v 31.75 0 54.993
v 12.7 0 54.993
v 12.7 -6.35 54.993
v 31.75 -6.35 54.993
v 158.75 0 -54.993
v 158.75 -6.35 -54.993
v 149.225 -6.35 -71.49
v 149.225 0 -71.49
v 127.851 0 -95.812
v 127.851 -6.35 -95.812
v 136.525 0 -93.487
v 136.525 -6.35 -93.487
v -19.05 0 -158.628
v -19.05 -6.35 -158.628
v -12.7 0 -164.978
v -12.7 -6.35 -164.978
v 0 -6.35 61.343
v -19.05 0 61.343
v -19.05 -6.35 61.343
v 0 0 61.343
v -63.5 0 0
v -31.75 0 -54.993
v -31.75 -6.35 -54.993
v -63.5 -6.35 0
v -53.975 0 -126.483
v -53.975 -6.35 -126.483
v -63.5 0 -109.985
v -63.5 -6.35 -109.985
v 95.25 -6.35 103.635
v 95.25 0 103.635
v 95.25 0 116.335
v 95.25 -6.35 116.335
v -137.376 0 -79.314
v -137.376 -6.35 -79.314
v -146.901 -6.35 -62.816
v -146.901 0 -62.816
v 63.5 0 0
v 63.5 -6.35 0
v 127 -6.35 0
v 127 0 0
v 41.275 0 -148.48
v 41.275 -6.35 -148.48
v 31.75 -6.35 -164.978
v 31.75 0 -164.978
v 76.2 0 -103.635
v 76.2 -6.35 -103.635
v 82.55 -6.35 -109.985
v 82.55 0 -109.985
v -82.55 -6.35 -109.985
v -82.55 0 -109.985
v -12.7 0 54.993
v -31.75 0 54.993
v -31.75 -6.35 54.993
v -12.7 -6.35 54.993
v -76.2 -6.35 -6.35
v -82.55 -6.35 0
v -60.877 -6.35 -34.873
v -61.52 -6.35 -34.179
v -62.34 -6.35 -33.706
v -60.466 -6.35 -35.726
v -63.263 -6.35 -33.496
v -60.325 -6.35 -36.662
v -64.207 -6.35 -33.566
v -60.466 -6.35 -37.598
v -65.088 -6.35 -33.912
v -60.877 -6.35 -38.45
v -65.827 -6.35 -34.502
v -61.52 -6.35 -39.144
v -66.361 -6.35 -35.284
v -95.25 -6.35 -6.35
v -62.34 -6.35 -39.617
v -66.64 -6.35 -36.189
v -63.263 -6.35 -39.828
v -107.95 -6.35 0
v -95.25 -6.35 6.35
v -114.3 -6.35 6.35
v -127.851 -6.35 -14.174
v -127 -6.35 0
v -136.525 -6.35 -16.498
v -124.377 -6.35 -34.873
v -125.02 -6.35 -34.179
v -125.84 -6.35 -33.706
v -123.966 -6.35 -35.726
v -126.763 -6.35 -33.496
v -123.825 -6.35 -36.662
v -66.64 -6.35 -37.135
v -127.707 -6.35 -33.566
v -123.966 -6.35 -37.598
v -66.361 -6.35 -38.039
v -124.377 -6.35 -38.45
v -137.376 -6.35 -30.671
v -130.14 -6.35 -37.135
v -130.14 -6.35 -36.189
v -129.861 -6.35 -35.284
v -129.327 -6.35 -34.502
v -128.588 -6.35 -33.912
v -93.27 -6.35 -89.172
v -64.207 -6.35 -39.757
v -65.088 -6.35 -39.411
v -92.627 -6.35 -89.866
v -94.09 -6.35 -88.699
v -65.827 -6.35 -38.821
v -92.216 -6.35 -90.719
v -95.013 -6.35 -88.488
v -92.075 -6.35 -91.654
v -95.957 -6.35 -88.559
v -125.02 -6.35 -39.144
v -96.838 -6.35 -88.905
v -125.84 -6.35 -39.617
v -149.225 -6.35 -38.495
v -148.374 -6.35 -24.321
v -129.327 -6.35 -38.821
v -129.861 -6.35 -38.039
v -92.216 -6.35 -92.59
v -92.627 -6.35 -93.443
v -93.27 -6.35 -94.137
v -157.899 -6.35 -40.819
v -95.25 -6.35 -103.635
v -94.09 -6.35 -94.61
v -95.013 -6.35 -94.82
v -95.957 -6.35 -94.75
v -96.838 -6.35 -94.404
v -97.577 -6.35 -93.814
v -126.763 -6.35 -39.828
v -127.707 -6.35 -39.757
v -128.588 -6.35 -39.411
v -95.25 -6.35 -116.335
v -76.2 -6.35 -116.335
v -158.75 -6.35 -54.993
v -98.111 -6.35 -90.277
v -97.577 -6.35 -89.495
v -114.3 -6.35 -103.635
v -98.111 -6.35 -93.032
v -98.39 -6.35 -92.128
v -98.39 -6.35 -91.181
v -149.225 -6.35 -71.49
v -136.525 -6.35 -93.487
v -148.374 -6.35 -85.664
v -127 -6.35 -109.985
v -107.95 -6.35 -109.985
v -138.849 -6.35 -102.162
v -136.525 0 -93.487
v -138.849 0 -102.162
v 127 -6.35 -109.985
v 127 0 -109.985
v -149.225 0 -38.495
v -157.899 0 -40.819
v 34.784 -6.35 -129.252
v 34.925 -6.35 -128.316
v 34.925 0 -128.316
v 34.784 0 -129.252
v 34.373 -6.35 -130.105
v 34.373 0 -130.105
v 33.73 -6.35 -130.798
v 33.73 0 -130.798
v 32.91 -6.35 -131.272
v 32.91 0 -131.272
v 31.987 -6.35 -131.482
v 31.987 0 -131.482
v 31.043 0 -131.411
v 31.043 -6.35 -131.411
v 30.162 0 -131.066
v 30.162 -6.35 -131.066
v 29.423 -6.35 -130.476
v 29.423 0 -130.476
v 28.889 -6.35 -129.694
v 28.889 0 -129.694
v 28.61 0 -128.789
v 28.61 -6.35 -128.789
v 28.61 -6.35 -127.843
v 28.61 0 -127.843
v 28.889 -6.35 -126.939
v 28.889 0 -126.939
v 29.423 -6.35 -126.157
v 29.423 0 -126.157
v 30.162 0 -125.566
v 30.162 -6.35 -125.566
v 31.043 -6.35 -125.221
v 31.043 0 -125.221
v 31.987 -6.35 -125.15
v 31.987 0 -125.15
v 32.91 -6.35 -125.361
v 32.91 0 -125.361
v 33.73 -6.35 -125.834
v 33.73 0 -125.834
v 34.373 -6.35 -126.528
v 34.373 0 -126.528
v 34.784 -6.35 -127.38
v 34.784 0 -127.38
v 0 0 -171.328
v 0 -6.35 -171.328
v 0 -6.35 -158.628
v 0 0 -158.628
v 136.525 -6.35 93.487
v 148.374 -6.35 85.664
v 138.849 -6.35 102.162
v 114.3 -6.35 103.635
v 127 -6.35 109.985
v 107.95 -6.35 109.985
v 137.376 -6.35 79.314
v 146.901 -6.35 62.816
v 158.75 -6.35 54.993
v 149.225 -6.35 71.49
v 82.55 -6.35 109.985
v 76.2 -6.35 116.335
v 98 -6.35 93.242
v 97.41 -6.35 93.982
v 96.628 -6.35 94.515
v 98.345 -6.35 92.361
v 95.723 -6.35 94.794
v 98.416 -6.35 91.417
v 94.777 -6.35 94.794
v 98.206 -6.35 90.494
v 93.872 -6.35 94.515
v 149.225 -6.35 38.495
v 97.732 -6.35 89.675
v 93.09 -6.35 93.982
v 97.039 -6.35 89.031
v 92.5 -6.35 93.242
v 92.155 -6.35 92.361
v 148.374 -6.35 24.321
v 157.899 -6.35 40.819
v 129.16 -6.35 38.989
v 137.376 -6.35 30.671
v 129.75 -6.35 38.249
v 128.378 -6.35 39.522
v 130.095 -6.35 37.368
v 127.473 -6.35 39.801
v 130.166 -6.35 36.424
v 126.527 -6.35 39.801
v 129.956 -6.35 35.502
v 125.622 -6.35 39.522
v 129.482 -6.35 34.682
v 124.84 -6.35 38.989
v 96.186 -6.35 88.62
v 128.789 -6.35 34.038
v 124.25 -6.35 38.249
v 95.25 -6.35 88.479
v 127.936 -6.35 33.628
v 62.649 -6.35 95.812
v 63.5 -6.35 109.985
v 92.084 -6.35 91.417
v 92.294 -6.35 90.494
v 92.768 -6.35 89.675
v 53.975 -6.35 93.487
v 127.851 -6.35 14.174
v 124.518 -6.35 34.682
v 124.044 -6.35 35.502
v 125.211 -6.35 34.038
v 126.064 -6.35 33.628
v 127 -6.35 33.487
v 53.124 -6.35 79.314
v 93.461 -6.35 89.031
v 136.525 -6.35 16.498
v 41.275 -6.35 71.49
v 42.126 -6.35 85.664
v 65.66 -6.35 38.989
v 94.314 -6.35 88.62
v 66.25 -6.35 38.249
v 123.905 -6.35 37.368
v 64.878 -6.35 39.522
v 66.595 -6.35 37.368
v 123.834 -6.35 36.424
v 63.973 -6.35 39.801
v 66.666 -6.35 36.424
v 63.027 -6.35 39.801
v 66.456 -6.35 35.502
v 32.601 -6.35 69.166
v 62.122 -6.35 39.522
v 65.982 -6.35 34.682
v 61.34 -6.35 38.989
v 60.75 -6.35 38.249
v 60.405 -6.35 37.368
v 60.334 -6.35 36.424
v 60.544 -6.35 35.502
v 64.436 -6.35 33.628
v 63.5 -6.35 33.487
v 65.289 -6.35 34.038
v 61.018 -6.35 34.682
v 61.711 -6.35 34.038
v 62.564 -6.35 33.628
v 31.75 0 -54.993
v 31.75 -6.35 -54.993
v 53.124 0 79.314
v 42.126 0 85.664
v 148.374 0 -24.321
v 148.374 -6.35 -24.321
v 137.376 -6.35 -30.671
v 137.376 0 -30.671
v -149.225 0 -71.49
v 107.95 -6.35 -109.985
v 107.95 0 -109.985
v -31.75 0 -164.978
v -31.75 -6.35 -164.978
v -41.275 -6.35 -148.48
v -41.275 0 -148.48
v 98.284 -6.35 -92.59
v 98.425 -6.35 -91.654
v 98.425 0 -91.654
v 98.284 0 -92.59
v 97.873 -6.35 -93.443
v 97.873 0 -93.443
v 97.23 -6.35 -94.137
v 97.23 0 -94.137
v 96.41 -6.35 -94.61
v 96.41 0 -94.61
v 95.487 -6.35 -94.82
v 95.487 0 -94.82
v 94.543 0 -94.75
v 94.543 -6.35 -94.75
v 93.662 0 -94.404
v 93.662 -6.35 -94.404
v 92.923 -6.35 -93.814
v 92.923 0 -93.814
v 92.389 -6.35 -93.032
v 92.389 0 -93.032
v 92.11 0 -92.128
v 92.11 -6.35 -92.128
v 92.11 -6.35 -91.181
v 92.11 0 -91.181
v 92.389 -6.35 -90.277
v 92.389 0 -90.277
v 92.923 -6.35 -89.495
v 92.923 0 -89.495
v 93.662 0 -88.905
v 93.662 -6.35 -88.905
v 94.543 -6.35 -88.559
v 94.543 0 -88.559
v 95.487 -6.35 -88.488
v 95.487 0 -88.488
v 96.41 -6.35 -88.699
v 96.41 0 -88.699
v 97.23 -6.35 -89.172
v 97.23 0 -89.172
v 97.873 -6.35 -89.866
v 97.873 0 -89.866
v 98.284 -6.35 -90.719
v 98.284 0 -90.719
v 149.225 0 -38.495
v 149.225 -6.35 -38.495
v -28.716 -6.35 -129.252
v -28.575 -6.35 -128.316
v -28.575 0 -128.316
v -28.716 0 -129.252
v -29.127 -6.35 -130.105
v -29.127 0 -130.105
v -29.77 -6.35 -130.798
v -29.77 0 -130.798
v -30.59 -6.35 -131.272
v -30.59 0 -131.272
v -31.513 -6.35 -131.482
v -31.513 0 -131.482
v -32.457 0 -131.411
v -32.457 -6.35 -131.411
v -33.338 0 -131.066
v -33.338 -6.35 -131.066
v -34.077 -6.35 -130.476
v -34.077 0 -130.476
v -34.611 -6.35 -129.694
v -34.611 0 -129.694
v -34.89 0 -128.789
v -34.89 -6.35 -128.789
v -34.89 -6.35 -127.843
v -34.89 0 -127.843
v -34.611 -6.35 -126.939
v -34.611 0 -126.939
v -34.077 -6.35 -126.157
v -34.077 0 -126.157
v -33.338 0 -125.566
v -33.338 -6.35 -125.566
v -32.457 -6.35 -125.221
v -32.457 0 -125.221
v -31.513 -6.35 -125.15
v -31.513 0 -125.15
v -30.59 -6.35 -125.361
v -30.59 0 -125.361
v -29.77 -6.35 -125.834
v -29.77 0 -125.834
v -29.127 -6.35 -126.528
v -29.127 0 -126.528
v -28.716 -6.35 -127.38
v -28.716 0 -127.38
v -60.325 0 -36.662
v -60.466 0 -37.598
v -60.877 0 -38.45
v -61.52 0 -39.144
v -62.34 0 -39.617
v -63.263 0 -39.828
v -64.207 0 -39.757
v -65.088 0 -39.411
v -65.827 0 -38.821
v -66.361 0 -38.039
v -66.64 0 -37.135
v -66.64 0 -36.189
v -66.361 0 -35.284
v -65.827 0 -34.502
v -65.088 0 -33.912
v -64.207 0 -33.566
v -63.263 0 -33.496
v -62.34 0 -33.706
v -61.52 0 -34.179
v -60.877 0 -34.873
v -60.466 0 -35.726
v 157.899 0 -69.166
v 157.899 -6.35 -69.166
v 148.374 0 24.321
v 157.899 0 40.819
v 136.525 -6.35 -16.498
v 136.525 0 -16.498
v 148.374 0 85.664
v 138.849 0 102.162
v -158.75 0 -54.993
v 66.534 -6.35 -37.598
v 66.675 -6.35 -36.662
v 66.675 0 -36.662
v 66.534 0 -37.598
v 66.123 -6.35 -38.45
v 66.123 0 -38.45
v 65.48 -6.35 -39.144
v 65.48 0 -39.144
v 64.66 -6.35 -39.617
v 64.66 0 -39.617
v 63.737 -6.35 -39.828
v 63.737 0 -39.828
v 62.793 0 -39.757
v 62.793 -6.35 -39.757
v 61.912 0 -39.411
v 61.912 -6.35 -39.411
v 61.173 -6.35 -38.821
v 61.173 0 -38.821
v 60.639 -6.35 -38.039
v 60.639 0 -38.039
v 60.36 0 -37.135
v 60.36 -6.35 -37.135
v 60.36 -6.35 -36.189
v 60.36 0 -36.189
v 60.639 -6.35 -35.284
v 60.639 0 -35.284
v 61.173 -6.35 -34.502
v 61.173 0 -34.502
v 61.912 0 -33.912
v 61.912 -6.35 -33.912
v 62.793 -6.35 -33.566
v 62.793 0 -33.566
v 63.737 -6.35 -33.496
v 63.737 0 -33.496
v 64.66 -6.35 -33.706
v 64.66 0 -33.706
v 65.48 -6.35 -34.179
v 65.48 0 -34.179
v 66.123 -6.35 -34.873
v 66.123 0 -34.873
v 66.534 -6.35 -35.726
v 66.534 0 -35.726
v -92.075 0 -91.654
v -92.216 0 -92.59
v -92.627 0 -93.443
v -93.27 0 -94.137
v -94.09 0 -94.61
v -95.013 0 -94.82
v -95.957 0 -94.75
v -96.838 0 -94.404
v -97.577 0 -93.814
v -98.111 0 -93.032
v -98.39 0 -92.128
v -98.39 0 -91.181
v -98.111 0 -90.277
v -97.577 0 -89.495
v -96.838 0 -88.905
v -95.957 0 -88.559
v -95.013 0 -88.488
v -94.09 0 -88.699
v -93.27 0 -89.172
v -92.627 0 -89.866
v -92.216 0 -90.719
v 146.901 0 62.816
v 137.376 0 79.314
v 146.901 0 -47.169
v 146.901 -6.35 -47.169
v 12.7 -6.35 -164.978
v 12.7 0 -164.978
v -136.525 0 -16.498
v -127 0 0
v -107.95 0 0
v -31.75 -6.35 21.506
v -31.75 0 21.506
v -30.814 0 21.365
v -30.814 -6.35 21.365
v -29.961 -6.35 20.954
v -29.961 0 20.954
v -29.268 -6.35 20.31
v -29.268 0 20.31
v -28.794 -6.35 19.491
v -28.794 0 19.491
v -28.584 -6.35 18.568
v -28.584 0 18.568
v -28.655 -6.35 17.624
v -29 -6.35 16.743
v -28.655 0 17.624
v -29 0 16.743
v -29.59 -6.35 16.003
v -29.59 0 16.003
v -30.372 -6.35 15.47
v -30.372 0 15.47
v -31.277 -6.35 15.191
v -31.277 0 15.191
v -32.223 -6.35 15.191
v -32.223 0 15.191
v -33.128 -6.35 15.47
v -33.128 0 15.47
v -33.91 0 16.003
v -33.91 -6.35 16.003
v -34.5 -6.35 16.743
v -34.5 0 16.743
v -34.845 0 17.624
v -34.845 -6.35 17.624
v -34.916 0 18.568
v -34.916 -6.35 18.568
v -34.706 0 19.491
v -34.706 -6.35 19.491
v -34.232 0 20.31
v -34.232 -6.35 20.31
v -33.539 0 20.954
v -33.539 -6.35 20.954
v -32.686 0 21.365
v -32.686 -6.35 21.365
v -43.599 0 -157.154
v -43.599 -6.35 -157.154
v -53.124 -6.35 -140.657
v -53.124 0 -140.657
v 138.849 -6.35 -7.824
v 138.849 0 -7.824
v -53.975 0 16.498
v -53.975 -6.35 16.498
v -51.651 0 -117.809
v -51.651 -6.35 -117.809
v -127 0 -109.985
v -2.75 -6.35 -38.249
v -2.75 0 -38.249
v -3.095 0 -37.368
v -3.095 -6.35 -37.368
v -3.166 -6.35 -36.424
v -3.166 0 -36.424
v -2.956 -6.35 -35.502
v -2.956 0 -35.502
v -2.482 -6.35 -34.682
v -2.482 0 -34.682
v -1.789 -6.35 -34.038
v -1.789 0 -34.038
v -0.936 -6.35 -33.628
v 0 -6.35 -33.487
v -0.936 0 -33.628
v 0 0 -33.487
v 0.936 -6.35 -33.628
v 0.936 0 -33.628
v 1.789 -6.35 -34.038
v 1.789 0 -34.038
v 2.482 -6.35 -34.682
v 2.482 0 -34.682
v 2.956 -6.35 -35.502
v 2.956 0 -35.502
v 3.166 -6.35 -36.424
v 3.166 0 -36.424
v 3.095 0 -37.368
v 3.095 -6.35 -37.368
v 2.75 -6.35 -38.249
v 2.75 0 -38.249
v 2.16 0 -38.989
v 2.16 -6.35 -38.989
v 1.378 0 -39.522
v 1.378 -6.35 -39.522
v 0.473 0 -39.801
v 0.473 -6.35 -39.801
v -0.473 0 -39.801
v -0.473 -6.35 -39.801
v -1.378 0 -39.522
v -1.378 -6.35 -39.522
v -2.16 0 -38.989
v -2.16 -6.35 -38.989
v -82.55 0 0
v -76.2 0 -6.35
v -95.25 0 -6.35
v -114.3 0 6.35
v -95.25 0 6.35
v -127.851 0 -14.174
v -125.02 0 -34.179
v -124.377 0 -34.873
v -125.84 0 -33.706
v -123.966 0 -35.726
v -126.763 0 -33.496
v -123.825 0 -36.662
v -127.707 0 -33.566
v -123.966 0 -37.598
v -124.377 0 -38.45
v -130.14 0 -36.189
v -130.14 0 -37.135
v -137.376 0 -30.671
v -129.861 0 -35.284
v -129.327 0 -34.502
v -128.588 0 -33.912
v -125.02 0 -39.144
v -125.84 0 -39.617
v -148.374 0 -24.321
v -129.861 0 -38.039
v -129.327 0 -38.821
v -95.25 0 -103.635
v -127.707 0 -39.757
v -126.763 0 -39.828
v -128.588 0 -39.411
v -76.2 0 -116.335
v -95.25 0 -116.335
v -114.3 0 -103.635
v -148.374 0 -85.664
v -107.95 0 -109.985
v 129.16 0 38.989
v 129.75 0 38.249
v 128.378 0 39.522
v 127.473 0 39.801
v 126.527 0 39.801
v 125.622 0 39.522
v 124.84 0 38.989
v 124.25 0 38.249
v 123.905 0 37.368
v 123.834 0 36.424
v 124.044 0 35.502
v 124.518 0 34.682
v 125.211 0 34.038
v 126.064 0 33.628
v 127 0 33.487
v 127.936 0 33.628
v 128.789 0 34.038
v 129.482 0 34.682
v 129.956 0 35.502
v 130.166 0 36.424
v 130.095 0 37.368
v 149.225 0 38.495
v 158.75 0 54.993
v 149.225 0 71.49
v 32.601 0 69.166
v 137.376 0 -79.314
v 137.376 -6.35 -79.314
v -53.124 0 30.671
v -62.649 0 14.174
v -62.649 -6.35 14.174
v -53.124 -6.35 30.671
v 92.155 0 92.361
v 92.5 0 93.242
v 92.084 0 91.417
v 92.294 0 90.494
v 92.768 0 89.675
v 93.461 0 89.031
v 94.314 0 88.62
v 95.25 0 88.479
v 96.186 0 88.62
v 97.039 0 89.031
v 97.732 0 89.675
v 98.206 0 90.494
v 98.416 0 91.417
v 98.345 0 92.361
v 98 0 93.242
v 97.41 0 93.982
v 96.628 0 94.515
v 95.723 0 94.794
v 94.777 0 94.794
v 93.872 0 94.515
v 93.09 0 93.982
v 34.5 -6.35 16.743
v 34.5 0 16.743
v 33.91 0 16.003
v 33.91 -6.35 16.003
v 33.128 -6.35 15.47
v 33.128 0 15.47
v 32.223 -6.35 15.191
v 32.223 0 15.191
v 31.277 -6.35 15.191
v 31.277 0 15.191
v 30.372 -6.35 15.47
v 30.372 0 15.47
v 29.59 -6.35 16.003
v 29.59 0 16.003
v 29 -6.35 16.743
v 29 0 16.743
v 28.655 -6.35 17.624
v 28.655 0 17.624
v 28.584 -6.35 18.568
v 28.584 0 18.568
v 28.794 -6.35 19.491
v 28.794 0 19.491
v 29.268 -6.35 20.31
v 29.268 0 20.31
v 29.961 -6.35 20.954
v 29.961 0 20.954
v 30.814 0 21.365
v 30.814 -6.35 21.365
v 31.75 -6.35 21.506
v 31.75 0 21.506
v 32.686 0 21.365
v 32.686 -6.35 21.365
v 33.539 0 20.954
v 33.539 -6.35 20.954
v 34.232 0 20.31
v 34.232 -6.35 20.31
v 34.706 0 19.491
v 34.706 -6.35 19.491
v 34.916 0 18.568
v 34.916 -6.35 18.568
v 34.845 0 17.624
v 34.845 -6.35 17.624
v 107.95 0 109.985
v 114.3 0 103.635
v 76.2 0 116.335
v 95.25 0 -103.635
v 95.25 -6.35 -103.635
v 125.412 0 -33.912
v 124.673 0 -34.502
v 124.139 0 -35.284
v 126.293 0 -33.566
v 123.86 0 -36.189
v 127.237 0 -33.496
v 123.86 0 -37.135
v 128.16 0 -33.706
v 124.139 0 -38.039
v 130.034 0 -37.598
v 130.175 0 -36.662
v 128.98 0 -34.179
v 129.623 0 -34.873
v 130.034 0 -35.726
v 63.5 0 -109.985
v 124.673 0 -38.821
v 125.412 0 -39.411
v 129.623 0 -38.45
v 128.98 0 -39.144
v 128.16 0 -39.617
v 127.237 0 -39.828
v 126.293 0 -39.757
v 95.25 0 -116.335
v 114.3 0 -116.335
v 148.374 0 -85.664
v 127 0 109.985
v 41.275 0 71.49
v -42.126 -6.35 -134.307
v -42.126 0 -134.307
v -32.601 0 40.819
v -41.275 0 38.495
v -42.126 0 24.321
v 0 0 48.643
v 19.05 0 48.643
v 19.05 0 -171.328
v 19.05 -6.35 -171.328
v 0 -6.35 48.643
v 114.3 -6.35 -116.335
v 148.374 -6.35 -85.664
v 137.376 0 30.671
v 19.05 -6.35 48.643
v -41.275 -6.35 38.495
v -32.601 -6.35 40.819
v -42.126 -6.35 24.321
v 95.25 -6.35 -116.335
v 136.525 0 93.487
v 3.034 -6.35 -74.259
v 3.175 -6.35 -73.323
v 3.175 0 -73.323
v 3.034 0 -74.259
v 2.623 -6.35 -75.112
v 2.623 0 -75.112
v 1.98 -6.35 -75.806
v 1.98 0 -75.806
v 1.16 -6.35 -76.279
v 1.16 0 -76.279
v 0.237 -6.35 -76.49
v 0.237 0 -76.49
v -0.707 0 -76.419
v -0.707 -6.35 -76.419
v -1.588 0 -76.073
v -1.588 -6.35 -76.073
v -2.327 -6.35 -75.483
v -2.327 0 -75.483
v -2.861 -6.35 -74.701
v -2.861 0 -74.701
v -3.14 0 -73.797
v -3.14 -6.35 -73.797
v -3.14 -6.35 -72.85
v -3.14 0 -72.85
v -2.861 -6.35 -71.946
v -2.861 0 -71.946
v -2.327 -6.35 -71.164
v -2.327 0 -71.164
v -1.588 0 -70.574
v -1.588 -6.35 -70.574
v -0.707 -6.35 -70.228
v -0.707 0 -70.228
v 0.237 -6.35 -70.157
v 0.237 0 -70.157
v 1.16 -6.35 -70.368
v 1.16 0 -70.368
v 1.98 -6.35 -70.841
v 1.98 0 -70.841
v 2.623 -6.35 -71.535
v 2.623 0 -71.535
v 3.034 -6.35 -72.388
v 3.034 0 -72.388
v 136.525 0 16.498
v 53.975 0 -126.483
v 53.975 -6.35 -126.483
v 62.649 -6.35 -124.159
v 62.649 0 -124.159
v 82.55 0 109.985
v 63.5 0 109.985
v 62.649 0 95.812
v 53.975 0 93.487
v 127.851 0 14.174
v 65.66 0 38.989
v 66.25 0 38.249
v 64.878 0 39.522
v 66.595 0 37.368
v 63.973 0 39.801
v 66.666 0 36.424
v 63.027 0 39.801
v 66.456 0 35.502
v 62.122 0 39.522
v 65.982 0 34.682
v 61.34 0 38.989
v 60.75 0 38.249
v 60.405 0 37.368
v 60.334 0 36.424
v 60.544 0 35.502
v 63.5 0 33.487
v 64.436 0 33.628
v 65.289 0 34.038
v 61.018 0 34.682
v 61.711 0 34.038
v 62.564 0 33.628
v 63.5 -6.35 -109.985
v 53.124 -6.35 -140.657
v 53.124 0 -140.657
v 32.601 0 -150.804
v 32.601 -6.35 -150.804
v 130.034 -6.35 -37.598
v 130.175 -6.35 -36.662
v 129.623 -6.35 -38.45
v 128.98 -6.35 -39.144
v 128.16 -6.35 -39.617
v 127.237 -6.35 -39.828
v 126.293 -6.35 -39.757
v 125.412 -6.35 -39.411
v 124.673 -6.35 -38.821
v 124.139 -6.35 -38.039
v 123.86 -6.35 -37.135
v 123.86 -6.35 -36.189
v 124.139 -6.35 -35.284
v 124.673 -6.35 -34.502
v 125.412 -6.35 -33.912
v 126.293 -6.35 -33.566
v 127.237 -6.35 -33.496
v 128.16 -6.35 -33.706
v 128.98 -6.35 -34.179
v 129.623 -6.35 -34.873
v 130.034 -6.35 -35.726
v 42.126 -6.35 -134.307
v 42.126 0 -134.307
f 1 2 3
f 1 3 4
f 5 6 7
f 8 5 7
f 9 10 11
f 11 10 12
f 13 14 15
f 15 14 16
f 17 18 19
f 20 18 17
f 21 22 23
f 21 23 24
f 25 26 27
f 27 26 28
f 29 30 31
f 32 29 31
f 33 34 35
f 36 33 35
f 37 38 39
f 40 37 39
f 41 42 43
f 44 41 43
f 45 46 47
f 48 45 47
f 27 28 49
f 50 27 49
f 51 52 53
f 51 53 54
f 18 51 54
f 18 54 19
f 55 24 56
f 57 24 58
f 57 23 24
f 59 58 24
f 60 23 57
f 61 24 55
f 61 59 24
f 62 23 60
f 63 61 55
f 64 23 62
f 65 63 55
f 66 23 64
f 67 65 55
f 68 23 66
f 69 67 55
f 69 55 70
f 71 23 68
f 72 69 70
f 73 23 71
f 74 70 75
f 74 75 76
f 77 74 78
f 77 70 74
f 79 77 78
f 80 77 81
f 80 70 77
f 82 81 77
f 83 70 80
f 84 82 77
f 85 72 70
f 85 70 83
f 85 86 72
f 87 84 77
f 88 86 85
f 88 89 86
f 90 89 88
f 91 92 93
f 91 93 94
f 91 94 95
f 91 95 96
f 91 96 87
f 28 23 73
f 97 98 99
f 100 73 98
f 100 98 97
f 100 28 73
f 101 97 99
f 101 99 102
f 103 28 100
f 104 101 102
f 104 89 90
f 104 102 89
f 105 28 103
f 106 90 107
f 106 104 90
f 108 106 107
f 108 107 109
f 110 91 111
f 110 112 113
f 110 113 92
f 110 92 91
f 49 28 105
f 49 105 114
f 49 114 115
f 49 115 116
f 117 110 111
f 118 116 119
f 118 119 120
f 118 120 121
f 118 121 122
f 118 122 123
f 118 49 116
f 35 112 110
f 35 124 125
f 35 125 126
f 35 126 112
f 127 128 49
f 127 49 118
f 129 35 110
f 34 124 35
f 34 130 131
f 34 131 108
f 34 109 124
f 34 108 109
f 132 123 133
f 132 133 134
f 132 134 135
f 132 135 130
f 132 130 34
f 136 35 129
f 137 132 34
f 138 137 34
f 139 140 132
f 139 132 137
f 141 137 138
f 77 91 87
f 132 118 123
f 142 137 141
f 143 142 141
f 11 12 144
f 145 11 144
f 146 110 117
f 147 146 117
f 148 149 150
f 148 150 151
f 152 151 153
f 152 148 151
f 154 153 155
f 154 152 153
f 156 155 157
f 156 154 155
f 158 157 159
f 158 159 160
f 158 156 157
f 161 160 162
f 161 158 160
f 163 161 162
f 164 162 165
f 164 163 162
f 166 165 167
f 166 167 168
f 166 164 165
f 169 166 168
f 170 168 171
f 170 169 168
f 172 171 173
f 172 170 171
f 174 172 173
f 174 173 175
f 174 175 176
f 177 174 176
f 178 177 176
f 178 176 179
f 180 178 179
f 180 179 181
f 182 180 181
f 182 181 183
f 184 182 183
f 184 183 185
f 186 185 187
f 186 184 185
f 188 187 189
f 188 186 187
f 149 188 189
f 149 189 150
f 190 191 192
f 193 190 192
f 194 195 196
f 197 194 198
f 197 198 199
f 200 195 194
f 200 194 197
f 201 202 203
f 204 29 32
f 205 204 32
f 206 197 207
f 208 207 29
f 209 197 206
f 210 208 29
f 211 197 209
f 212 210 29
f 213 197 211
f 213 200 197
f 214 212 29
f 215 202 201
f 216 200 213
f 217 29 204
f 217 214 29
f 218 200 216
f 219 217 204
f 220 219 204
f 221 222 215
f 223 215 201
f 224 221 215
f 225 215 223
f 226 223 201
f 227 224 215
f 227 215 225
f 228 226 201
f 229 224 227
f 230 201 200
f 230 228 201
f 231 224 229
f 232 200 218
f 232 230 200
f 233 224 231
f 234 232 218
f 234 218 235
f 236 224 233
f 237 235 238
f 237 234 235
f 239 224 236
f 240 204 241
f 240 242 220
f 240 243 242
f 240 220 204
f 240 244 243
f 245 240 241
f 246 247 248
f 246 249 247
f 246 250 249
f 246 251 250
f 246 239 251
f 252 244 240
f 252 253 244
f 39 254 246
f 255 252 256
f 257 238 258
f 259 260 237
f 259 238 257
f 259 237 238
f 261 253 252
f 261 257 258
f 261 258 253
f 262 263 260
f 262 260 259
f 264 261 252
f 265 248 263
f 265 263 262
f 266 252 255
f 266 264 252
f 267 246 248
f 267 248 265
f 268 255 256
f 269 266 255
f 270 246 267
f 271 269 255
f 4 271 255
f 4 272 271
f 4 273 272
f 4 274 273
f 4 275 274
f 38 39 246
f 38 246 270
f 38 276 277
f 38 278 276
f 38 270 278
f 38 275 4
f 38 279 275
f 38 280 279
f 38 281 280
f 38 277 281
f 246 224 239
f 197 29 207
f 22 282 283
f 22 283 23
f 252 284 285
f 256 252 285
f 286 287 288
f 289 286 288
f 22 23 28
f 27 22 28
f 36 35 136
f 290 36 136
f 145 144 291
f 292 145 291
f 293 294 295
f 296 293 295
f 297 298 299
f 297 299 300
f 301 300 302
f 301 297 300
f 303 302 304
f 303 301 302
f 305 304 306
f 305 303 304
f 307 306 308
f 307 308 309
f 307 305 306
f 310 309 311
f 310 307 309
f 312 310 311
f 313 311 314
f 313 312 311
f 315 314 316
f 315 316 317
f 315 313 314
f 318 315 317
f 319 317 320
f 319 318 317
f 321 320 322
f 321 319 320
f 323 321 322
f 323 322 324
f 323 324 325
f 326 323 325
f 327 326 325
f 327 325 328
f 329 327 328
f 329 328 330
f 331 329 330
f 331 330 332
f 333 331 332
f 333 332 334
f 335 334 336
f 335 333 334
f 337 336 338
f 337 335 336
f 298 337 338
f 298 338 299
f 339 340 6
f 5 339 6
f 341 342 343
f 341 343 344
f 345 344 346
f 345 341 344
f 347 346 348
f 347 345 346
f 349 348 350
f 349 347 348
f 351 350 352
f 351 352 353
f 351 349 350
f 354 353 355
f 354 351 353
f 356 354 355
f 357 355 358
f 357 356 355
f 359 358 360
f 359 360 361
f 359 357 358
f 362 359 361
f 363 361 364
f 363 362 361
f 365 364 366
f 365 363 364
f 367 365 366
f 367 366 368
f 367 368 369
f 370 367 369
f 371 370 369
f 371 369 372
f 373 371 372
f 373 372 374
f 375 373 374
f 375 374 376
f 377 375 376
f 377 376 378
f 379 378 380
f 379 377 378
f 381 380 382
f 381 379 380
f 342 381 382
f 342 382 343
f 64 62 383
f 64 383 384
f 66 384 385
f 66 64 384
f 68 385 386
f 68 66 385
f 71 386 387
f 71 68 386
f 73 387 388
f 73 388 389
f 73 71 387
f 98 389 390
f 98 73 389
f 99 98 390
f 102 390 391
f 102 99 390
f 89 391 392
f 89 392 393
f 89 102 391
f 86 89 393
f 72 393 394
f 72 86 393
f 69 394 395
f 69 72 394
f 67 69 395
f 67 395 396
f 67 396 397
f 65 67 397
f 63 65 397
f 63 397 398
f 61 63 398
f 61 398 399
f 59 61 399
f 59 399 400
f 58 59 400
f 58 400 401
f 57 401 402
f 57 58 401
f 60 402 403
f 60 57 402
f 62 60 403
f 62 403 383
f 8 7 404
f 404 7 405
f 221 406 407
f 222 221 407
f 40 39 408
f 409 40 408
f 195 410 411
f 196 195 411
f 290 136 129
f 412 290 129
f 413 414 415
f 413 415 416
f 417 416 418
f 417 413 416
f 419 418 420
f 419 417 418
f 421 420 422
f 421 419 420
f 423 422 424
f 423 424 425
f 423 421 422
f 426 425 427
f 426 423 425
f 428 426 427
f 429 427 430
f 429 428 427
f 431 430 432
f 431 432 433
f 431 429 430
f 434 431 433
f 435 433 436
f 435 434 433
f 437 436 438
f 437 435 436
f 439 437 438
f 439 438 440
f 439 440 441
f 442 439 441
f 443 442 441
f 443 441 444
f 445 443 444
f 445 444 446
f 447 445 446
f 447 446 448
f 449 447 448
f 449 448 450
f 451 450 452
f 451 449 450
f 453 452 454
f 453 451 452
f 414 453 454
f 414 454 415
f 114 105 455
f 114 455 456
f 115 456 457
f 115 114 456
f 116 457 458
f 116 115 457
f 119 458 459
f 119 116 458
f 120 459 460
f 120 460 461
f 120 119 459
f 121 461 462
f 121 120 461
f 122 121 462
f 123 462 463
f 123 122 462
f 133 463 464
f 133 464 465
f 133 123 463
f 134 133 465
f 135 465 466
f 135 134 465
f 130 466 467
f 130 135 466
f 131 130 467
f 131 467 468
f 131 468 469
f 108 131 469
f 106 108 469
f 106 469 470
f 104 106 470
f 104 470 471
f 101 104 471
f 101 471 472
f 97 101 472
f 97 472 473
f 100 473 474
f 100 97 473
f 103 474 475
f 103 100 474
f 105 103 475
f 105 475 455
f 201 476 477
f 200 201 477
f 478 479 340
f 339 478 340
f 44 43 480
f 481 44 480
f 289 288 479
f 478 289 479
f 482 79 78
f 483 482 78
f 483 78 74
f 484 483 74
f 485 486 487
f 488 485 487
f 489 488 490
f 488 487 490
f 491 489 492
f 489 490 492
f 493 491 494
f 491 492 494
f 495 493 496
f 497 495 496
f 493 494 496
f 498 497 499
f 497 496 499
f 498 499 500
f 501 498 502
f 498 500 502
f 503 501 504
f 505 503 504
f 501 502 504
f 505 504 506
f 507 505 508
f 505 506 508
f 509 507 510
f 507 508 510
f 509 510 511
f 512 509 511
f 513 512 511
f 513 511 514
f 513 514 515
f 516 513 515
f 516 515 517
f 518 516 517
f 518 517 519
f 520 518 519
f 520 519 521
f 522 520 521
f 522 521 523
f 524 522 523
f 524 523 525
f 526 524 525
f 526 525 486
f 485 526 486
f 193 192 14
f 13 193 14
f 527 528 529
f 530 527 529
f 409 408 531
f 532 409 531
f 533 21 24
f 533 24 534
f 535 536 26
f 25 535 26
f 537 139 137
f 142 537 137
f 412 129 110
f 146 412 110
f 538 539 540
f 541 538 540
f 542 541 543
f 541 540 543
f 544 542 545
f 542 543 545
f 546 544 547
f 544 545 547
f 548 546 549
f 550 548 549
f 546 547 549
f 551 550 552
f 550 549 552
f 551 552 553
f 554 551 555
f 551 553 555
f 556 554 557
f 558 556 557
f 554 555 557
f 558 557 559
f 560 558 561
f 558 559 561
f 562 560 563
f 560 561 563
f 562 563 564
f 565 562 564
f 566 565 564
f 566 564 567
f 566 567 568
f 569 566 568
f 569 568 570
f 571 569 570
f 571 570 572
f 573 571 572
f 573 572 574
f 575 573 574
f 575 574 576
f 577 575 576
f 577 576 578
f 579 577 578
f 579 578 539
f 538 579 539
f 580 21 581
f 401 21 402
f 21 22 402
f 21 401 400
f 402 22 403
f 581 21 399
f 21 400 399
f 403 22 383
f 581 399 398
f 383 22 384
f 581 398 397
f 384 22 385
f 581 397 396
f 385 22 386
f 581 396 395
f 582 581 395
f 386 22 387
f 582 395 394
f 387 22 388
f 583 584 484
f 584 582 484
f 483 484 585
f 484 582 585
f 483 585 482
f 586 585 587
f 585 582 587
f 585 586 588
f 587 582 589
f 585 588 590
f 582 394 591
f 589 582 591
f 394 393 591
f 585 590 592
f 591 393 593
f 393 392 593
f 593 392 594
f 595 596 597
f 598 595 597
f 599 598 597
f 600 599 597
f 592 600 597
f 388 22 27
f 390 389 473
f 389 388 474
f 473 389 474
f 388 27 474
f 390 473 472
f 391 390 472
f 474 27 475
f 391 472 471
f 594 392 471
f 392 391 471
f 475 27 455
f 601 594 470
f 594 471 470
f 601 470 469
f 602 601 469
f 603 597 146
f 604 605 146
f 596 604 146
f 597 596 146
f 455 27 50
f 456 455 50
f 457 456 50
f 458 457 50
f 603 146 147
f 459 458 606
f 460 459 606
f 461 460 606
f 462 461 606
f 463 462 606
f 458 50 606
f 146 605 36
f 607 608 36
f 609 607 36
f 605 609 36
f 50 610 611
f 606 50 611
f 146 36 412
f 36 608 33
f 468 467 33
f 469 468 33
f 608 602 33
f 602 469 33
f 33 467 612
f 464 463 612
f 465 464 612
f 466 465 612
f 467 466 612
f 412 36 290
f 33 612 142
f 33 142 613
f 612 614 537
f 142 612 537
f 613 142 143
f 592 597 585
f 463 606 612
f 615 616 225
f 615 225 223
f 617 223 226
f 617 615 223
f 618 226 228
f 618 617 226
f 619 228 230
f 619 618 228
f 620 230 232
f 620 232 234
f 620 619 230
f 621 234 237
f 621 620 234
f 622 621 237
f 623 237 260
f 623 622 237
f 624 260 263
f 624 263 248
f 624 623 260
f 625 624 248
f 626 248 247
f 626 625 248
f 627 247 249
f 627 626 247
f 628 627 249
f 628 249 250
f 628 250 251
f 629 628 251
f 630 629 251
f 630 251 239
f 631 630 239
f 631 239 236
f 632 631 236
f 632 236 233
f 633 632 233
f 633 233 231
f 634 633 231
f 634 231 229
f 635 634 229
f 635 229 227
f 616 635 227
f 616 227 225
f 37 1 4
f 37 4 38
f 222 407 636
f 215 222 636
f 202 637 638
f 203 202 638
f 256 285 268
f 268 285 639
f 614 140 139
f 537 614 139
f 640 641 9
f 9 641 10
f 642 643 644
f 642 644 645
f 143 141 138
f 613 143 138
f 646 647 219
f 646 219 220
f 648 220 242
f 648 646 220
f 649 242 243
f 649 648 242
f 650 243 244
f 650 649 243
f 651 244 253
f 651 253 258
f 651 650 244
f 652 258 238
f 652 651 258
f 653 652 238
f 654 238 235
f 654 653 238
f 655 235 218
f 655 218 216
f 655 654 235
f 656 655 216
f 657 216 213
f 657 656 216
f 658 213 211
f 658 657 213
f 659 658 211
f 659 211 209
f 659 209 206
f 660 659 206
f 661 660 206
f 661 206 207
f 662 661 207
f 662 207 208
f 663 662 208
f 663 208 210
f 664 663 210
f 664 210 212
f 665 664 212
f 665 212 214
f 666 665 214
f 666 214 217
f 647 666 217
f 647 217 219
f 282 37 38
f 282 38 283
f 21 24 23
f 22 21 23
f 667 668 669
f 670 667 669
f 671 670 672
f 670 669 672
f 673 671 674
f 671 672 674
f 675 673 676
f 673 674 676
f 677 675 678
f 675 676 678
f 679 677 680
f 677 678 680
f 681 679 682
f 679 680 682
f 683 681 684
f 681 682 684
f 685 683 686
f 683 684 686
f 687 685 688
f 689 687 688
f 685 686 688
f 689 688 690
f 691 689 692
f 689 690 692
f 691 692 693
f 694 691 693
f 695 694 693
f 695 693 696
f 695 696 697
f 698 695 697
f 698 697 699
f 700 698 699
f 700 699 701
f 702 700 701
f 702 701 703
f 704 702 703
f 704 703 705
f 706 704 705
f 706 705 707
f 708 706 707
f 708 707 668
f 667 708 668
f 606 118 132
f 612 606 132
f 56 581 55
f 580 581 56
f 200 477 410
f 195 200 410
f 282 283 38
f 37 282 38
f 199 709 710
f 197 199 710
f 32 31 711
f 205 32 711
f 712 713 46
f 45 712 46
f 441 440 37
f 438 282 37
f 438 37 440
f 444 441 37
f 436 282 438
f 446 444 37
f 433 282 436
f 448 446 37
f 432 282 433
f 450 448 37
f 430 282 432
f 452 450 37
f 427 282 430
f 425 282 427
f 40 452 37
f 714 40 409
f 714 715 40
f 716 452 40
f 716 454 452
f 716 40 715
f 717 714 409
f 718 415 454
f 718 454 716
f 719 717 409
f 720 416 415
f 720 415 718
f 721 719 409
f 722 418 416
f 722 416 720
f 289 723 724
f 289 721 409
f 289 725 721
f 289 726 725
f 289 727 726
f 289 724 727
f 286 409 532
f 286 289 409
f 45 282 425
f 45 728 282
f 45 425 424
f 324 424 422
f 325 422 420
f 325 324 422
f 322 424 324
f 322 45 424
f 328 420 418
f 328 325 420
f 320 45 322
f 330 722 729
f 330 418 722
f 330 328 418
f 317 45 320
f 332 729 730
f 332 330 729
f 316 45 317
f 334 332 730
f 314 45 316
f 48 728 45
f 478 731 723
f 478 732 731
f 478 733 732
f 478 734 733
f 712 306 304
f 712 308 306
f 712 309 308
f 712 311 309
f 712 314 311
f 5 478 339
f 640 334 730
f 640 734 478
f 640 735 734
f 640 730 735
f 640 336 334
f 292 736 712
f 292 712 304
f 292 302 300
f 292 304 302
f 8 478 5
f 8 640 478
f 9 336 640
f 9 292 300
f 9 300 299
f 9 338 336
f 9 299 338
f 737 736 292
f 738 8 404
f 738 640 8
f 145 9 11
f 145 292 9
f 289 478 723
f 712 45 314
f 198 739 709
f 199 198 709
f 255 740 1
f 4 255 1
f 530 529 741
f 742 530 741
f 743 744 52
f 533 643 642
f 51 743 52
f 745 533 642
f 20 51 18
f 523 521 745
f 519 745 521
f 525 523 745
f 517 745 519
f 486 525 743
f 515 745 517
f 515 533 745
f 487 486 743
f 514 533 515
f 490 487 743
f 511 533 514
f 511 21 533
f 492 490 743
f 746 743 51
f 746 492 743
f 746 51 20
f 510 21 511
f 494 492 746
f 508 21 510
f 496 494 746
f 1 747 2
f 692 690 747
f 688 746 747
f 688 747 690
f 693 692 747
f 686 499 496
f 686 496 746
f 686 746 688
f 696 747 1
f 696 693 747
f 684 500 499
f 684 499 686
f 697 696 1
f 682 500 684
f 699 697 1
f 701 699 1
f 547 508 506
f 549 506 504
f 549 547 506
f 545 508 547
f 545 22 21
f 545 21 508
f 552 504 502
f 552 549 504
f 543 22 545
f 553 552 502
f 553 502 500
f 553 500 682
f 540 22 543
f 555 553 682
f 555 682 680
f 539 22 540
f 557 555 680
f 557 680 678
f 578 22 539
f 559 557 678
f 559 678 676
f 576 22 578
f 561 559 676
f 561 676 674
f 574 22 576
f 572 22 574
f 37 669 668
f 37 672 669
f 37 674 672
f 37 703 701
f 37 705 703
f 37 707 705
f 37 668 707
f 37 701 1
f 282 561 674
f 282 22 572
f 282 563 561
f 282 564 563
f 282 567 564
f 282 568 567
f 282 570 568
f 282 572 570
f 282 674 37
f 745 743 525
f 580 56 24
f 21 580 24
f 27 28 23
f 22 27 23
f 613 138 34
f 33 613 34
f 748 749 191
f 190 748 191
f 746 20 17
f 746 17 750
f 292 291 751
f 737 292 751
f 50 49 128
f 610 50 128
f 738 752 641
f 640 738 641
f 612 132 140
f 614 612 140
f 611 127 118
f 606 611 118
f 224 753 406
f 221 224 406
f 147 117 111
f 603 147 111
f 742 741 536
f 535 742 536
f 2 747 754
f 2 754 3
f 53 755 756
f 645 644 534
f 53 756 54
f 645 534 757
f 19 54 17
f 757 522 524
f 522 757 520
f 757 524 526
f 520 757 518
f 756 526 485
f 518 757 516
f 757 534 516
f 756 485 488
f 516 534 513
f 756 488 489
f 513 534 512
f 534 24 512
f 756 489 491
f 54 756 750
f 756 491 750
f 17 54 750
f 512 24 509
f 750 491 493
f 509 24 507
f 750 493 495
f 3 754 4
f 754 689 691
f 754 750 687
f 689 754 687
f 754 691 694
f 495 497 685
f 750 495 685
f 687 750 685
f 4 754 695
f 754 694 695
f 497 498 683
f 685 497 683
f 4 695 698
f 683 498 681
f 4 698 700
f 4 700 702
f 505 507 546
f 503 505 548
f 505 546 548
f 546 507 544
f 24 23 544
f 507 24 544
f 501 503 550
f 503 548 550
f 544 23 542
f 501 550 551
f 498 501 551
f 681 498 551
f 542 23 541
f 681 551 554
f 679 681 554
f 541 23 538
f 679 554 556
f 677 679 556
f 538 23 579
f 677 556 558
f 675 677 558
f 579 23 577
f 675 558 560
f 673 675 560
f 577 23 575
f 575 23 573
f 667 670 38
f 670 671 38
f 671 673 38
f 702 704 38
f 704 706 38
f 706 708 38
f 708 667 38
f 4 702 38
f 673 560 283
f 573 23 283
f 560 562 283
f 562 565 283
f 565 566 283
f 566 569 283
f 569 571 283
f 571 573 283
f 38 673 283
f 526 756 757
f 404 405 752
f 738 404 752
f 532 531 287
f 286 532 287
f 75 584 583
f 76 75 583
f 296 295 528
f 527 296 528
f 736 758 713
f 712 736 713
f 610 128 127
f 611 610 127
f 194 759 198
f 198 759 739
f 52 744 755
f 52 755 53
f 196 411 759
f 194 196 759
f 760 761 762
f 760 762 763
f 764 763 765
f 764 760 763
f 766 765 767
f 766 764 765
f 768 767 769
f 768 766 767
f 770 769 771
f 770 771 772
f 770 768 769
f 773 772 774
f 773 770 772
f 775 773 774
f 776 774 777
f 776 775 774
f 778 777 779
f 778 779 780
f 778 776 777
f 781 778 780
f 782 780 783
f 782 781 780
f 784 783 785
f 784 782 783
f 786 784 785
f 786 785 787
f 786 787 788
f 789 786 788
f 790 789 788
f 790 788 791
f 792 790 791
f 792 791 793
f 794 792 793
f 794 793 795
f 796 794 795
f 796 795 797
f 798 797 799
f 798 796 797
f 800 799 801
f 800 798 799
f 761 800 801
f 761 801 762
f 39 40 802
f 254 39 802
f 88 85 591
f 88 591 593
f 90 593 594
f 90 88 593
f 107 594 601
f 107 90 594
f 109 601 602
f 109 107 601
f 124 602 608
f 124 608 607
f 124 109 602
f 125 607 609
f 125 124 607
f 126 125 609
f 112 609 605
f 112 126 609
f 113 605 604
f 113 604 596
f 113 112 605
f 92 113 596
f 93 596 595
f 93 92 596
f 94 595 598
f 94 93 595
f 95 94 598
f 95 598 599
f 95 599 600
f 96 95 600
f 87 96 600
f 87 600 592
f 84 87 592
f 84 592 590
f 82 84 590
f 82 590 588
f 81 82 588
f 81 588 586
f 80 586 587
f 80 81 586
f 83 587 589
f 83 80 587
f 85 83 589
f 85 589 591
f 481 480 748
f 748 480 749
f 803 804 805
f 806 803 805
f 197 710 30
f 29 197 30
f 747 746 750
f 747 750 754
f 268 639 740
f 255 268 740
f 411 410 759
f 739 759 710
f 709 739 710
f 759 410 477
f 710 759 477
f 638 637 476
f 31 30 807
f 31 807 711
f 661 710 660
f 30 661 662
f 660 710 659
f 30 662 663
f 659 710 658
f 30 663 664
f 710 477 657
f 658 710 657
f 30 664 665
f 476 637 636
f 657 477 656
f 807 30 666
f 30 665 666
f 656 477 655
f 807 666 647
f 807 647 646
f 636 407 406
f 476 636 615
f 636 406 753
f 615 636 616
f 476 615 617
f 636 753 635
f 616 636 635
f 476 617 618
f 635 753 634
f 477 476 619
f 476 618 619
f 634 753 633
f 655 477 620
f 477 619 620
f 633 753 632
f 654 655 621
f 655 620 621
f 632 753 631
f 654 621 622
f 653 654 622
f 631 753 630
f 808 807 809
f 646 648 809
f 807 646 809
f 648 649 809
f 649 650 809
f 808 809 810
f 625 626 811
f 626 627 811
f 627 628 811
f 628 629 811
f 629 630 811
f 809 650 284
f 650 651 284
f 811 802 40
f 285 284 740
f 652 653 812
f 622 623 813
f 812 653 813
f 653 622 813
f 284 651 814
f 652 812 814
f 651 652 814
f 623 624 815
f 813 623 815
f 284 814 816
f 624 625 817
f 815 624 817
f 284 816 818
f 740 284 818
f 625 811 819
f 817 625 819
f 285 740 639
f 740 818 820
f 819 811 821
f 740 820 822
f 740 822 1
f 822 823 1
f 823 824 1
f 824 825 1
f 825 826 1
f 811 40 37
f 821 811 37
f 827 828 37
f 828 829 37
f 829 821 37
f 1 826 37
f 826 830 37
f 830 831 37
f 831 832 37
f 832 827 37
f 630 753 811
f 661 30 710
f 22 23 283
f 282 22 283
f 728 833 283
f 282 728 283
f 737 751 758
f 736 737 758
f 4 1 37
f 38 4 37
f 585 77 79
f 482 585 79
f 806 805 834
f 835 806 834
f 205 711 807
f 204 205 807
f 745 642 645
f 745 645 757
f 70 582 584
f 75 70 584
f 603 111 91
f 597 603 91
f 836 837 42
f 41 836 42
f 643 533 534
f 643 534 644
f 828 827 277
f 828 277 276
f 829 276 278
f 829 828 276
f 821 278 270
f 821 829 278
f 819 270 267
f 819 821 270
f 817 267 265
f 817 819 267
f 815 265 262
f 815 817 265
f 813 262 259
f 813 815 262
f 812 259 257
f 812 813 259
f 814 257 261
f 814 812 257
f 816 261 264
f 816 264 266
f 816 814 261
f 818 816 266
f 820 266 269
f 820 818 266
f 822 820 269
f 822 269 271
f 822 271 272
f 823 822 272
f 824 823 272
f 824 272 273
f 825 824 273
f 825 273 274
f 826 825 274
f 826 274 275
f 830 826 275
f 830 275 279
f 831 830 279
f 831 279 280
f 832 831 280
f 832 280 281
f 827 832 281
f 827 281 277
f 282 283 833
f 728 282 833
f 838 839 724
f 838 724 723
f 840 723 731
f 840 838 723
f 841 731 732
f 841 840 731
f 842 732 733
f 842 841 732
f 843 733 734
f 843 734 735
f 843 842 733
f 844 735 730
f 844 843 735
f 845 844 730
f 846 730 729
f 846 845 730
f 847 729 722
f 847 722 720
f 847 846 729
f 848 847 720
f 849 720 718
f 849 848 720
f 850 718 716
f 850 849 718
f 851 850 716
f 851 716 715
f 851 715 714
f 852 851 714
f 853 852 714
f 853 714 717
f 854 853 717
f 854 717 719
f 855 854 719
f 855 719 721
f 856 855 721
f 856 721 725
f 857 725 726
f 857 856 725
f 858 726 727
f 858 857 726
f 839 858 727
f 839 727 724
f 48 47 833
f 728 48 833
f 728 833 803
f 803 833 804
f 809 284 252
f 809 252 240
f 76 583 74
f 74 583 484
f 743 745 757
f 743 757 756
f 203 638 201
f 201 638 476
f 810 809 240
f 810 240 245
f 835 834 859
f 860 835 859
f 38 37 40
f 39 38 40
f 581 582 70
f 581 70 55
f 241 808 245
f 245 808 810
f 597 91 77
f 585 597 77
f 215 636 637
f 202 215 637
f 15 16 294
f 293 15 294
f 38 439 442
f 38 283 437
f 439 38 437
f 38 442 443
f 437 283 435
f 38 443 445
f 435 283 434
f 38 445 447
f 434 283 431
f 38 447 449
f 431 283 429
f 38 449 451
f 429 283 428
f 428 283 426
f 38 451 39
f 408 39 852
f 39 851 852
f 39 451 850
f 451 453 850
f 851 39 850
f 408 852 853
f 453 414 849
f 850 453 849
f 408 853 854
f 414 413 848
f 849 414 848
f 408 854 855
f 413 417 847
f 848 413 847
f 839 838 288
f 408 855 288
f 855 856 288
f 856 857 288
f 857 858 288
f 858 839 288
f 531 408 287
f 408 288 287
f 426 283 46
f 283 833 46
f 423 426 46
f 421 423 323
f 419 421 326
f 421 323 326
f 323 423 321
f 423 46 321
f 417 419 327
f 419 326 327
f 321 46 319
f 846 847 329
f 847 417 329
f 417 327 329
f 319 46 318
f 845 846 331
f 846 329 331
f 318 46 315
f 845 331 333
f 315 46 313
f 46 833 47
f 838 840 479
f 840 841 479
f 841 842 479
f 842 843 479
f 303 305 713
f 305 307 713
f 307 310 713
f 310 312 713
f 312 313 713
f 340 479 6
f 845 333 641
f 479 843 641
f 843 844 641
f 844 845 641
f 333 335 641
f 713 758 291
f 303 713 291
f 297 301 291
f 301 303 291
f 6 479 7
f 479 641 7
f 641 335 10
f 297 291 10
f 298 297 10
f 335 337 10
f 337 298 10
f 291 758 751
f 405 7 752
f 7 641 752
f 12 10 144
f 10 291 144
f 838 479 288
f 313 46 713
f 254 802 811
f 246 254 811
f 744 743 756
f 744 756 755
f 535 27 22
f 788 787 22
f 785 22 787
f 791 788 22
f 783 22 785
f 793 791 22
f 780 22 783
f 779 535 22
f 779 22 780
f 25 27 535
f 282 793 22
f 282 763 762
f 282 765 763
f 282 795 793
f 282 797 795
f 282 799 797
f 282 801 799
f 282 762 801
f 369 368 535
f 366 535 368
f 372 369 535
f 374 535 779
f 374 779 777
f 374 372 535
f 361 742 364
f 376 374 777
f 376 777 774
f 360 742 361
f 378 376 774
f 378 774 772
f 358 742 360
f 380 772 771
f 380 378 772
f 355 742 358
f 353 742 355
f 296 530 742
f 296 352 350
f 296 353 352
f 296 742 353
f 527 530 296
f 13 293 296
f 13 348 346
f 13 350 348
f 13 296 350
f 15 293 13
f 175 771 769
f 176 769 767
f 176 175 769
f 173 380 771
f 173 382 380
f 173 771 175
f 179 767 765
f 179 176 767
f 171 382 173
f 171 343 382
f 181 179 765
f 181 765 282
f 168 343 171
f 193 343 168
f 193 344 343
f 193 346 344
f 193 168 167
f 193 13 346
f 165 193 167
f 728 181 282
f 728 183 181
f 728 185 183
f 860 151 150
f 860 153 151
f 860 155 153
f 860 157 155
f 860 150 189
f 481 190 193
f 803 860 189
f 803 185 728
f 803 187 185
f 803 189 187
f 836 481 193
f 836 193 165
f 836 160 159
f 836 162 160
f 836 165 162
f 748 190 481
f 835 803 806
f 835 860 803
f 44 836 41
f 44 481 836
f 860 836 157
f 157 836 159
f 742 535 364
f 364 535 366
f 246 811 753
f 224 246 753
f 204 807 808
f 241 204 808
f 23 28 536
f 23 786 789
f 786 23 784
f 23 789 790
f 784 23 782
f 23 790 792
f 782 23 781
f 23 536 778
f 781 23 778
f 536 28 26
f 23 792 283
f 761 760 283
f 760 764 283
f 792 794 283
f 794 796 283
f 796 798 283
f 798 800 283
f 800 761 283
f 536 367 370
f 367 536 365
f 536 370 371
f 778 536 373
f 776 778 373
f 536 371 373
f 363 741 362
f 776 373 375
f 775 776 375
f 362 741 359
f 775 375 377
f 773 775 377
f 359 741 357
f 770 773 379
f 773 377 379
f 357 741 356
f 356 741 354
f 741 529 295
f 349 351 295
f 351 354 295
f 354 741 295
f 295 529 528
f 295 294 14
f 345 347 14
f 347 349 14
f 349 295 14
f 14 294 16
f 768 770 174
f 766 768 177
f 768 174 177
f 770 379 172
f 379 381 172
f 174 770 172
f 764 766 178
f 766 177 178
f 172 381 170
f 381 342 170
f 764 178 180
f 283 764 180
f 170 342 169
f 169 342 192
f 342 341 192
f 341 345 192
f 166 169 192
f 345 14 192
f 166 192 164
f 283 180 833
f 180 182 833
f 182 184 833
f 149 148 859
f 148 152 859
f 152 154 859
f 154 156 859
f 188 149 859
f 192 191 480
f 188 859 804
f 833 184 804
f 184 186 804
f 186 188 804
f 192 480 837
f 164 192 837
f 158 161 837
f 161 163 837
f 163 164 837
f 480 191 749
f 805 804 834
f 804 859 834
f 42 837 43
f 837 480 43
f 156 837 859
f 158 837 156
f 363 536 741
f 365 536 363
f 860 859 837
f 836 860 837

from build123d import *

# Parameters (mm, degrees)
BOSS_EXTRUDE1_DEPTH     = 6.35
SKETCH9_R               = 3.175
CUT_EXTRUDE3_DEPTH      = 85.242269675
CIRPATTERN6_COUNT       = 3
CUT_EXTRUDE2_DEPTH      = 194.232075495
BOSS_EXTRUDE3_DEPTH     = 6.35
CIRPATTERN3_COUNT       = 3
CIRPATTERN3_ANGLE       = 120
CIRPATTERN5_START       = -6.35
CIRPATTERN5_OUTLINE_R   = 3.175
CIRPATTERN5_DEPTH       = 6.35
CIRPATTERN5_2_OUTLINE_R = 3.175
CIRPATTERN5_2_DEPTH     = 6.35
CIRPATTERN5_3_OUTLINE_R = 3.175
CIRPATTERN5_3_DEPTH     = 6.35
BOSS_EXTRUDE4_DEPTH     = 6.35
CUT_EXTRUDE4_DEPTH      = 234.655972662
CIRPATTERN7_COUNT       = 2
CIRPATTERN7_ANGLE       = 60
CUT_EXTRUDE5_DEPTH      = 234.655972662
BOSS_EXTRUDE5_DEPTH     = 6.35
CUT_EXTRUDE6_DEPTH      = 234.655972662
BOSS_EXTRUDE6_DEPTH     = 6.35


# Read off the part's stored shape, not the designer's step: CirPattern5
with BuildPart() as part:
    # Sketch1 → Boss-Extrude1 (new body)
    with BuildSketch(Plane(origin=(0, 0, 0), x_dir=(1, 0, 0), z_dir=(0, 1, 0))):
        Polygon((63.5, 0), (31.75, 54.99261314), (-31.75, 54.99261314), (-63.5, 0), (-31.75, -54.99261314), (31.75, -54.99261314), align=None)
    extrude(amount=-BOSS_EXTRUDE1_DEPTH)

    # Sketch9 → Cut-Extrude3 (cut, through all)
    with BuildSketch(Plane(origin=(0, 0, 0), x_dir=(1, 0, 0), z_dir=(0, 1, 0))):
        with Locations(Location((-31.75, -18.330871047, 0), (0, 0, 270))):
            Circle(SKETCH9_R)
    cut_extrude3 = extrude(amount=-CUT_EXTRUDE3_DEPTH, mode=Mode.SUBTRACT)

    # CirPattern6: Cut-Extrude3 ×3 about axis
    cirpattern6_axis = Axis((0, 0, 0), (0, 1, 0))
    for i in range(1, CIRPATTERN6_COUNT):
        add(cut_extrude3.rotate(cirpattern6_axis, i * 360 / CIRPATTERN6_COUNT), mode=Mode.SUBTRACT)


with BuildPart() as body_2:
    # Mirror1: mirrored copy
    add(part.part.mirror(Plane(origin=(31.75, -6.35, 54.99261314), x_dir=(-0.4999999999999997, 0, 0.8660254037844387), z_dir=(0.8660254037844387, 0, 0.49999999999999983))))

    # Sketch5 → Cut-Extrude2 (cut, through all)
    with BuildSketch(Plane(origin=(0, 0, 0), x_dir=(1, 0, 0), z_dir=(0, 1, 0))):
        Polygon((136.525, -16.497783942), (127.850738686, -14.173522628), (137.375738686, -30.67130657), (142.875, -27.49630657), align=None)
    cut_extrude2 = extrude(amount=-CUT_EXTRUDE2_DEPTH, mode=Mode.SUBTRACT)

    # Sketch7 → Boss-Extrude3 (add)
    with BuildSketch(Plane(origin=(0, 0, 0), x_dir=(1, 0, 0), z_dir=(0, 1, 0))):
        Polygon((142.875, -27.49630657), (148.374261314, -24.32130657), (157.899261314, -40.819090512), (149.225, -38.494829198), align=None)
    boss_extrude3 = extrude(amount=-BOSS_EXTRUDE3_DEPTH)

    # CirPattern3: Cut-Extrude2, Boss-Extrude3 ×3 about axis
    cirpattern3_axis = Axis((95.25, 0, 54.99261314), (0, -1, 0))
    add([cut_extrude2.rotate(cirpattern3_axis, i * CIRPATTERN3_ANGLE / (CIRPATTERN3_COUNT - 1)) for i in range(1, CIRPATTERN3_COUNT)], mode=Mode.SUBTRACT)
    add([boss_extrude3.rotate(cirpattern3_axis, i * CIRPATTERN3_ANGLE / (CIRPATTERN3_COUNT - 1)) for i in range(1, CIRPATTERN3_COUNT)])

    # Sketch14 → Cut-Extrude6 (cut, through all)
    with BuildSketch(Plane(origin=(0, 0, 0), x_dir=(1, 0, 0), z_dir=(0, 1, 0))):
        Polygon((47.625, -82.48891971), (53.124261314, -79.31391971), (62.649261314, -95.811703653), (53.975, -93.487442339), align=None)
    extrude(amount=-CUT_EXTRUDE6_DEPTH, mode=Mode.SUBTRACT)

    # Sketch15 → Boss-Extrude6 (add)
    with BuildSketch(Plane(origin=(0, 0, 0), x_dir=(1, 0, 0), z_dir=(0, 1, 0))):
        Polygon((47.625, -82.48891971), (42.125738686, -85.66391971), (32.600738686, -69.166135768), (41.275, -71.490397082), align=None)
    extrude(amount=-BOSS_EXTRUDE6_DEPTH)


with BuildPart() as body_3:
    # CirPattern5 outline → CirPattern5 (new body)
    with BuildSketch(Plane(origin=(0, 0, 0), x_dir=(1, 0, 0), z_dir=(0, 1, 0)).offset(CIRPATTERN5_START)):
        Polygon((-31.75, 54.99261314), (-63.5, 109.985226281), (-82.55, 109.985226281), (-76.2, 116.335226281), (-95.25, 116.335226281), (-95.25, 103.635226281), (-114.3, 103.635226281), (-107.95, 109.985226281), (-127, 109.985226281), (-136.525, 93.487442339), (-138.849261314, 102.161703653), (-148.374261314, 85.66391971), (-137.375738686, 79.31391971), (-146.900738686, 62.816135768), (-149.225, 71.490397082), (-158.75, 54.99261314), (-149.225, 38.494829198), (-157.899261314, 40.819090512), (-148.374261314, 24.32130657), (-137.375738686, 30.67130657), (-127.850738686, 14.173522628), (-136.525, 16.497783942), (-127, 0), (-63.5, 0), align=None)
        with Locations((-127, 36.661742094)):
            Circle(CIRPATTERN5_OUTLINE_R, mode=Mode.SUBTRACT)
        with Locations((-63.5, 36.661742094)):
            Circle(CIRPATTERN5_OUTLINE_R, mode=Mode.SUBTRACT)
        with Locations((-95.25, 91.654355234)):
            Circle(CIRPATTERN5_OUTLINE_R, mode=Mode.SUBTRACT)
    extrude(amount=CIRPATTERN5_DEPTH)

    # Sketch12 → Cut-Extrude5 (cut, through all)
    with BuildSketch(Plane(origin=(0, 0, 0), x_dir=(1, 0, 0), z_dir=(0, 1, 0))):
        Polygon((-95.25, 0), (-95.25, 6.35), (-76.2, 6.35), (-82.55, 0), align=None)
    extrude(amount=-CUT_EXTRUDE5_DEPTH, mode=Mode.SUBTRACT)

    # Sketch13 → Boss-Extrude5 (add)
    with BuildSketch(Plane(origin=(0, 0, 0), x_dir=(1, 0, 0), z_dir=(0, 1, 0))):
        Polygon((-95.25, 0), (-95.25, -6.35), (-114.3, -6.35), (-107.95, 0), align=None)
    extrude(amount=-BOSS_EXTRUDE5_DEPTH)


with BuildPart() as body_4:
    # CirPattern5 2 outline → CirPattern5 2 (new body)
    with BuildSketch(Plane(origin=(0, 0, 0), x_dir=(1, 0, 0), z_dir=(0, 1, 0)).offset(CIRPATTERN5_START)):
        Polygon((31.75, 54.99261314), (63.5, 109.985226281), (53.975, 126.483010223), (62.649261314, 124.158748909), (53.124261314, 140.656532851), (42.125738686, 134.306532851), (32.600738686, 150.804316793), (41.275, 148.480055479), (31.75, 164.977839421), (12.7, 164.977839421), (19.05, 171.327839421), (0, 171.327839421), (0, 158.627839421), (-19.05, 158.627839421), (-12.7, 164.977839421), (-31.75, 164.977839421), (-41.275, 148.480055479), (-43.599261314, 157.154316793), (-53.124261314, 140.656532851), (-42.125738686, 134.306532851), (-51.650738686, 117.808748909), (-53.975, 126.483010223), (-63.5, 109.985226281), (-31.75, 54.99261314), align=None)
        with Locations((0, 73.323484187)):
            Circle(CIRPATTERN5_2_OUTLINE_R, mode=Mode.SUBTRACT)
        with Locations((-31.75, 128.316097327)):
            Circle(CIRPATTERN5_2_OUTLINE_R, mode=Mode.SUBTRACT)
        with Locations((31.75, 128.316097327)):
            Circle(CIRPATTERN5_2_OUTLINE_R, mode=Mode.SUBTRACT)
    extrude(amount=CIRPATTERN5_2_DEPTH)


with BuildPart() as body_5:
    # CirPattern5 3 outline → CirPattern5 3 (new body)
    with BuildSketch(Plane(origin=(0, 0, 0), x_dir=(1, 0, 0), z_dir=(0, 1, 0)).offset(CIRPATTERN5_START)):
        Polygon((63.5, 0), (127, 0), (136.525, 16.497783942), (138.849261314, 7.823522628), (148.374261314, 24.32130657), (137.375738686, 30.67130657), (146.900738686, 47.169090512), (149.225, 38.494829198), (158.75, 54.99261314), (149.225, 71.490397082), (157.899261314, 69.166135768), (148.374261314, 85.66391971), (137.375738686, 79.31391971), (127.850738686, 95.811703653), (136.525, 93.487442339), (127, 109.985226281), (107.95, 109.985226281), (114.3, 116.335226281), (95.25, 116.335226281), (95.25, 103.635226281), (76.2, 103.635226281), (82.55, 109.985226281), (63.5, 109.985226281), (31.75, 54.99261314), align=None)
        with Locations((63.5, 36.661742094)):
            Circle(CIRPATTERN5_3_OUTLINE_R, mode=Mode.SUBTRACT)
        with Locations((127, 36.661742094)):
            Circle(CIRPATTERN5_3_OUTLINE_R, mode=Mode.SUBTRACT)
        with Locations((95.25, 91.654355234)):
            Circle(CIRPATTERN5_3_OUTLINE_R, mode=Mode.SUBTRACT)
    extrude(amount=CIRPATTERN5_3_DEPTH)


with BuildPart() as part_1:
    add(part.part)

    # Sketch10 → Boss-Extrude4 (add)
    with BuildSketch(Plane(origin=(0, 0, 0), x_dir=(1, 0, 0), z_dir=(0, 1, 0))):
        Polygon((-53.975, -16.497783942), (-62.649261314, -14.173522628), (-53.124261314, -30.67130657), (-47.625, -27.49630657), align=None)
    boss_extrude4 = extrude(amount=-BOSS_EXTRUDE4_DEPTH)

    # Sketch11 → Cut-Extrude4 (cut, through all)
    with BuildSketch(Plane(origin=(0, 0, 0), x_dir=(1, 0, 0), z_dir=(0, 1, 0))):
        Polygon((-47.625, -27.49630657), (-42.125738686, -24.32130657), (-32.600738686, -40.819090512), (-41.275, -38.494829198), align=None)
    cut_extrude4 = extrude(amount=-CUT_EXTRUDE4_DEPTH, mode=Mode.SUBTRACT)

    # CirPattern7: Boss-Extrude4, Cut-Extrude4 ×2 about axis
    cirpattern7_axis = Axis((0, 0, 0), (0, 1, 0))
    add([boss_extrude4.rotate(cirpattern7_axis, i * CIRPATTERN7_ANGLE / (CIRPATTERN7_COUNT - 1)) for i in range(1, CIRPATTERN7_COUNT)])
    add([cut_extrude4.rotate(cirpattern7_axis, i * CIRPATTERN7_ANGLE / (CIRPATTERN7_COUNT - 1)) for i in range(1, CIRPATTERN7_COUNT)], mode=Mode.SUBTRACT)


solid = Compound([body_2.part, body_3.part, body_4.part, body_5.part, part_1.part])
